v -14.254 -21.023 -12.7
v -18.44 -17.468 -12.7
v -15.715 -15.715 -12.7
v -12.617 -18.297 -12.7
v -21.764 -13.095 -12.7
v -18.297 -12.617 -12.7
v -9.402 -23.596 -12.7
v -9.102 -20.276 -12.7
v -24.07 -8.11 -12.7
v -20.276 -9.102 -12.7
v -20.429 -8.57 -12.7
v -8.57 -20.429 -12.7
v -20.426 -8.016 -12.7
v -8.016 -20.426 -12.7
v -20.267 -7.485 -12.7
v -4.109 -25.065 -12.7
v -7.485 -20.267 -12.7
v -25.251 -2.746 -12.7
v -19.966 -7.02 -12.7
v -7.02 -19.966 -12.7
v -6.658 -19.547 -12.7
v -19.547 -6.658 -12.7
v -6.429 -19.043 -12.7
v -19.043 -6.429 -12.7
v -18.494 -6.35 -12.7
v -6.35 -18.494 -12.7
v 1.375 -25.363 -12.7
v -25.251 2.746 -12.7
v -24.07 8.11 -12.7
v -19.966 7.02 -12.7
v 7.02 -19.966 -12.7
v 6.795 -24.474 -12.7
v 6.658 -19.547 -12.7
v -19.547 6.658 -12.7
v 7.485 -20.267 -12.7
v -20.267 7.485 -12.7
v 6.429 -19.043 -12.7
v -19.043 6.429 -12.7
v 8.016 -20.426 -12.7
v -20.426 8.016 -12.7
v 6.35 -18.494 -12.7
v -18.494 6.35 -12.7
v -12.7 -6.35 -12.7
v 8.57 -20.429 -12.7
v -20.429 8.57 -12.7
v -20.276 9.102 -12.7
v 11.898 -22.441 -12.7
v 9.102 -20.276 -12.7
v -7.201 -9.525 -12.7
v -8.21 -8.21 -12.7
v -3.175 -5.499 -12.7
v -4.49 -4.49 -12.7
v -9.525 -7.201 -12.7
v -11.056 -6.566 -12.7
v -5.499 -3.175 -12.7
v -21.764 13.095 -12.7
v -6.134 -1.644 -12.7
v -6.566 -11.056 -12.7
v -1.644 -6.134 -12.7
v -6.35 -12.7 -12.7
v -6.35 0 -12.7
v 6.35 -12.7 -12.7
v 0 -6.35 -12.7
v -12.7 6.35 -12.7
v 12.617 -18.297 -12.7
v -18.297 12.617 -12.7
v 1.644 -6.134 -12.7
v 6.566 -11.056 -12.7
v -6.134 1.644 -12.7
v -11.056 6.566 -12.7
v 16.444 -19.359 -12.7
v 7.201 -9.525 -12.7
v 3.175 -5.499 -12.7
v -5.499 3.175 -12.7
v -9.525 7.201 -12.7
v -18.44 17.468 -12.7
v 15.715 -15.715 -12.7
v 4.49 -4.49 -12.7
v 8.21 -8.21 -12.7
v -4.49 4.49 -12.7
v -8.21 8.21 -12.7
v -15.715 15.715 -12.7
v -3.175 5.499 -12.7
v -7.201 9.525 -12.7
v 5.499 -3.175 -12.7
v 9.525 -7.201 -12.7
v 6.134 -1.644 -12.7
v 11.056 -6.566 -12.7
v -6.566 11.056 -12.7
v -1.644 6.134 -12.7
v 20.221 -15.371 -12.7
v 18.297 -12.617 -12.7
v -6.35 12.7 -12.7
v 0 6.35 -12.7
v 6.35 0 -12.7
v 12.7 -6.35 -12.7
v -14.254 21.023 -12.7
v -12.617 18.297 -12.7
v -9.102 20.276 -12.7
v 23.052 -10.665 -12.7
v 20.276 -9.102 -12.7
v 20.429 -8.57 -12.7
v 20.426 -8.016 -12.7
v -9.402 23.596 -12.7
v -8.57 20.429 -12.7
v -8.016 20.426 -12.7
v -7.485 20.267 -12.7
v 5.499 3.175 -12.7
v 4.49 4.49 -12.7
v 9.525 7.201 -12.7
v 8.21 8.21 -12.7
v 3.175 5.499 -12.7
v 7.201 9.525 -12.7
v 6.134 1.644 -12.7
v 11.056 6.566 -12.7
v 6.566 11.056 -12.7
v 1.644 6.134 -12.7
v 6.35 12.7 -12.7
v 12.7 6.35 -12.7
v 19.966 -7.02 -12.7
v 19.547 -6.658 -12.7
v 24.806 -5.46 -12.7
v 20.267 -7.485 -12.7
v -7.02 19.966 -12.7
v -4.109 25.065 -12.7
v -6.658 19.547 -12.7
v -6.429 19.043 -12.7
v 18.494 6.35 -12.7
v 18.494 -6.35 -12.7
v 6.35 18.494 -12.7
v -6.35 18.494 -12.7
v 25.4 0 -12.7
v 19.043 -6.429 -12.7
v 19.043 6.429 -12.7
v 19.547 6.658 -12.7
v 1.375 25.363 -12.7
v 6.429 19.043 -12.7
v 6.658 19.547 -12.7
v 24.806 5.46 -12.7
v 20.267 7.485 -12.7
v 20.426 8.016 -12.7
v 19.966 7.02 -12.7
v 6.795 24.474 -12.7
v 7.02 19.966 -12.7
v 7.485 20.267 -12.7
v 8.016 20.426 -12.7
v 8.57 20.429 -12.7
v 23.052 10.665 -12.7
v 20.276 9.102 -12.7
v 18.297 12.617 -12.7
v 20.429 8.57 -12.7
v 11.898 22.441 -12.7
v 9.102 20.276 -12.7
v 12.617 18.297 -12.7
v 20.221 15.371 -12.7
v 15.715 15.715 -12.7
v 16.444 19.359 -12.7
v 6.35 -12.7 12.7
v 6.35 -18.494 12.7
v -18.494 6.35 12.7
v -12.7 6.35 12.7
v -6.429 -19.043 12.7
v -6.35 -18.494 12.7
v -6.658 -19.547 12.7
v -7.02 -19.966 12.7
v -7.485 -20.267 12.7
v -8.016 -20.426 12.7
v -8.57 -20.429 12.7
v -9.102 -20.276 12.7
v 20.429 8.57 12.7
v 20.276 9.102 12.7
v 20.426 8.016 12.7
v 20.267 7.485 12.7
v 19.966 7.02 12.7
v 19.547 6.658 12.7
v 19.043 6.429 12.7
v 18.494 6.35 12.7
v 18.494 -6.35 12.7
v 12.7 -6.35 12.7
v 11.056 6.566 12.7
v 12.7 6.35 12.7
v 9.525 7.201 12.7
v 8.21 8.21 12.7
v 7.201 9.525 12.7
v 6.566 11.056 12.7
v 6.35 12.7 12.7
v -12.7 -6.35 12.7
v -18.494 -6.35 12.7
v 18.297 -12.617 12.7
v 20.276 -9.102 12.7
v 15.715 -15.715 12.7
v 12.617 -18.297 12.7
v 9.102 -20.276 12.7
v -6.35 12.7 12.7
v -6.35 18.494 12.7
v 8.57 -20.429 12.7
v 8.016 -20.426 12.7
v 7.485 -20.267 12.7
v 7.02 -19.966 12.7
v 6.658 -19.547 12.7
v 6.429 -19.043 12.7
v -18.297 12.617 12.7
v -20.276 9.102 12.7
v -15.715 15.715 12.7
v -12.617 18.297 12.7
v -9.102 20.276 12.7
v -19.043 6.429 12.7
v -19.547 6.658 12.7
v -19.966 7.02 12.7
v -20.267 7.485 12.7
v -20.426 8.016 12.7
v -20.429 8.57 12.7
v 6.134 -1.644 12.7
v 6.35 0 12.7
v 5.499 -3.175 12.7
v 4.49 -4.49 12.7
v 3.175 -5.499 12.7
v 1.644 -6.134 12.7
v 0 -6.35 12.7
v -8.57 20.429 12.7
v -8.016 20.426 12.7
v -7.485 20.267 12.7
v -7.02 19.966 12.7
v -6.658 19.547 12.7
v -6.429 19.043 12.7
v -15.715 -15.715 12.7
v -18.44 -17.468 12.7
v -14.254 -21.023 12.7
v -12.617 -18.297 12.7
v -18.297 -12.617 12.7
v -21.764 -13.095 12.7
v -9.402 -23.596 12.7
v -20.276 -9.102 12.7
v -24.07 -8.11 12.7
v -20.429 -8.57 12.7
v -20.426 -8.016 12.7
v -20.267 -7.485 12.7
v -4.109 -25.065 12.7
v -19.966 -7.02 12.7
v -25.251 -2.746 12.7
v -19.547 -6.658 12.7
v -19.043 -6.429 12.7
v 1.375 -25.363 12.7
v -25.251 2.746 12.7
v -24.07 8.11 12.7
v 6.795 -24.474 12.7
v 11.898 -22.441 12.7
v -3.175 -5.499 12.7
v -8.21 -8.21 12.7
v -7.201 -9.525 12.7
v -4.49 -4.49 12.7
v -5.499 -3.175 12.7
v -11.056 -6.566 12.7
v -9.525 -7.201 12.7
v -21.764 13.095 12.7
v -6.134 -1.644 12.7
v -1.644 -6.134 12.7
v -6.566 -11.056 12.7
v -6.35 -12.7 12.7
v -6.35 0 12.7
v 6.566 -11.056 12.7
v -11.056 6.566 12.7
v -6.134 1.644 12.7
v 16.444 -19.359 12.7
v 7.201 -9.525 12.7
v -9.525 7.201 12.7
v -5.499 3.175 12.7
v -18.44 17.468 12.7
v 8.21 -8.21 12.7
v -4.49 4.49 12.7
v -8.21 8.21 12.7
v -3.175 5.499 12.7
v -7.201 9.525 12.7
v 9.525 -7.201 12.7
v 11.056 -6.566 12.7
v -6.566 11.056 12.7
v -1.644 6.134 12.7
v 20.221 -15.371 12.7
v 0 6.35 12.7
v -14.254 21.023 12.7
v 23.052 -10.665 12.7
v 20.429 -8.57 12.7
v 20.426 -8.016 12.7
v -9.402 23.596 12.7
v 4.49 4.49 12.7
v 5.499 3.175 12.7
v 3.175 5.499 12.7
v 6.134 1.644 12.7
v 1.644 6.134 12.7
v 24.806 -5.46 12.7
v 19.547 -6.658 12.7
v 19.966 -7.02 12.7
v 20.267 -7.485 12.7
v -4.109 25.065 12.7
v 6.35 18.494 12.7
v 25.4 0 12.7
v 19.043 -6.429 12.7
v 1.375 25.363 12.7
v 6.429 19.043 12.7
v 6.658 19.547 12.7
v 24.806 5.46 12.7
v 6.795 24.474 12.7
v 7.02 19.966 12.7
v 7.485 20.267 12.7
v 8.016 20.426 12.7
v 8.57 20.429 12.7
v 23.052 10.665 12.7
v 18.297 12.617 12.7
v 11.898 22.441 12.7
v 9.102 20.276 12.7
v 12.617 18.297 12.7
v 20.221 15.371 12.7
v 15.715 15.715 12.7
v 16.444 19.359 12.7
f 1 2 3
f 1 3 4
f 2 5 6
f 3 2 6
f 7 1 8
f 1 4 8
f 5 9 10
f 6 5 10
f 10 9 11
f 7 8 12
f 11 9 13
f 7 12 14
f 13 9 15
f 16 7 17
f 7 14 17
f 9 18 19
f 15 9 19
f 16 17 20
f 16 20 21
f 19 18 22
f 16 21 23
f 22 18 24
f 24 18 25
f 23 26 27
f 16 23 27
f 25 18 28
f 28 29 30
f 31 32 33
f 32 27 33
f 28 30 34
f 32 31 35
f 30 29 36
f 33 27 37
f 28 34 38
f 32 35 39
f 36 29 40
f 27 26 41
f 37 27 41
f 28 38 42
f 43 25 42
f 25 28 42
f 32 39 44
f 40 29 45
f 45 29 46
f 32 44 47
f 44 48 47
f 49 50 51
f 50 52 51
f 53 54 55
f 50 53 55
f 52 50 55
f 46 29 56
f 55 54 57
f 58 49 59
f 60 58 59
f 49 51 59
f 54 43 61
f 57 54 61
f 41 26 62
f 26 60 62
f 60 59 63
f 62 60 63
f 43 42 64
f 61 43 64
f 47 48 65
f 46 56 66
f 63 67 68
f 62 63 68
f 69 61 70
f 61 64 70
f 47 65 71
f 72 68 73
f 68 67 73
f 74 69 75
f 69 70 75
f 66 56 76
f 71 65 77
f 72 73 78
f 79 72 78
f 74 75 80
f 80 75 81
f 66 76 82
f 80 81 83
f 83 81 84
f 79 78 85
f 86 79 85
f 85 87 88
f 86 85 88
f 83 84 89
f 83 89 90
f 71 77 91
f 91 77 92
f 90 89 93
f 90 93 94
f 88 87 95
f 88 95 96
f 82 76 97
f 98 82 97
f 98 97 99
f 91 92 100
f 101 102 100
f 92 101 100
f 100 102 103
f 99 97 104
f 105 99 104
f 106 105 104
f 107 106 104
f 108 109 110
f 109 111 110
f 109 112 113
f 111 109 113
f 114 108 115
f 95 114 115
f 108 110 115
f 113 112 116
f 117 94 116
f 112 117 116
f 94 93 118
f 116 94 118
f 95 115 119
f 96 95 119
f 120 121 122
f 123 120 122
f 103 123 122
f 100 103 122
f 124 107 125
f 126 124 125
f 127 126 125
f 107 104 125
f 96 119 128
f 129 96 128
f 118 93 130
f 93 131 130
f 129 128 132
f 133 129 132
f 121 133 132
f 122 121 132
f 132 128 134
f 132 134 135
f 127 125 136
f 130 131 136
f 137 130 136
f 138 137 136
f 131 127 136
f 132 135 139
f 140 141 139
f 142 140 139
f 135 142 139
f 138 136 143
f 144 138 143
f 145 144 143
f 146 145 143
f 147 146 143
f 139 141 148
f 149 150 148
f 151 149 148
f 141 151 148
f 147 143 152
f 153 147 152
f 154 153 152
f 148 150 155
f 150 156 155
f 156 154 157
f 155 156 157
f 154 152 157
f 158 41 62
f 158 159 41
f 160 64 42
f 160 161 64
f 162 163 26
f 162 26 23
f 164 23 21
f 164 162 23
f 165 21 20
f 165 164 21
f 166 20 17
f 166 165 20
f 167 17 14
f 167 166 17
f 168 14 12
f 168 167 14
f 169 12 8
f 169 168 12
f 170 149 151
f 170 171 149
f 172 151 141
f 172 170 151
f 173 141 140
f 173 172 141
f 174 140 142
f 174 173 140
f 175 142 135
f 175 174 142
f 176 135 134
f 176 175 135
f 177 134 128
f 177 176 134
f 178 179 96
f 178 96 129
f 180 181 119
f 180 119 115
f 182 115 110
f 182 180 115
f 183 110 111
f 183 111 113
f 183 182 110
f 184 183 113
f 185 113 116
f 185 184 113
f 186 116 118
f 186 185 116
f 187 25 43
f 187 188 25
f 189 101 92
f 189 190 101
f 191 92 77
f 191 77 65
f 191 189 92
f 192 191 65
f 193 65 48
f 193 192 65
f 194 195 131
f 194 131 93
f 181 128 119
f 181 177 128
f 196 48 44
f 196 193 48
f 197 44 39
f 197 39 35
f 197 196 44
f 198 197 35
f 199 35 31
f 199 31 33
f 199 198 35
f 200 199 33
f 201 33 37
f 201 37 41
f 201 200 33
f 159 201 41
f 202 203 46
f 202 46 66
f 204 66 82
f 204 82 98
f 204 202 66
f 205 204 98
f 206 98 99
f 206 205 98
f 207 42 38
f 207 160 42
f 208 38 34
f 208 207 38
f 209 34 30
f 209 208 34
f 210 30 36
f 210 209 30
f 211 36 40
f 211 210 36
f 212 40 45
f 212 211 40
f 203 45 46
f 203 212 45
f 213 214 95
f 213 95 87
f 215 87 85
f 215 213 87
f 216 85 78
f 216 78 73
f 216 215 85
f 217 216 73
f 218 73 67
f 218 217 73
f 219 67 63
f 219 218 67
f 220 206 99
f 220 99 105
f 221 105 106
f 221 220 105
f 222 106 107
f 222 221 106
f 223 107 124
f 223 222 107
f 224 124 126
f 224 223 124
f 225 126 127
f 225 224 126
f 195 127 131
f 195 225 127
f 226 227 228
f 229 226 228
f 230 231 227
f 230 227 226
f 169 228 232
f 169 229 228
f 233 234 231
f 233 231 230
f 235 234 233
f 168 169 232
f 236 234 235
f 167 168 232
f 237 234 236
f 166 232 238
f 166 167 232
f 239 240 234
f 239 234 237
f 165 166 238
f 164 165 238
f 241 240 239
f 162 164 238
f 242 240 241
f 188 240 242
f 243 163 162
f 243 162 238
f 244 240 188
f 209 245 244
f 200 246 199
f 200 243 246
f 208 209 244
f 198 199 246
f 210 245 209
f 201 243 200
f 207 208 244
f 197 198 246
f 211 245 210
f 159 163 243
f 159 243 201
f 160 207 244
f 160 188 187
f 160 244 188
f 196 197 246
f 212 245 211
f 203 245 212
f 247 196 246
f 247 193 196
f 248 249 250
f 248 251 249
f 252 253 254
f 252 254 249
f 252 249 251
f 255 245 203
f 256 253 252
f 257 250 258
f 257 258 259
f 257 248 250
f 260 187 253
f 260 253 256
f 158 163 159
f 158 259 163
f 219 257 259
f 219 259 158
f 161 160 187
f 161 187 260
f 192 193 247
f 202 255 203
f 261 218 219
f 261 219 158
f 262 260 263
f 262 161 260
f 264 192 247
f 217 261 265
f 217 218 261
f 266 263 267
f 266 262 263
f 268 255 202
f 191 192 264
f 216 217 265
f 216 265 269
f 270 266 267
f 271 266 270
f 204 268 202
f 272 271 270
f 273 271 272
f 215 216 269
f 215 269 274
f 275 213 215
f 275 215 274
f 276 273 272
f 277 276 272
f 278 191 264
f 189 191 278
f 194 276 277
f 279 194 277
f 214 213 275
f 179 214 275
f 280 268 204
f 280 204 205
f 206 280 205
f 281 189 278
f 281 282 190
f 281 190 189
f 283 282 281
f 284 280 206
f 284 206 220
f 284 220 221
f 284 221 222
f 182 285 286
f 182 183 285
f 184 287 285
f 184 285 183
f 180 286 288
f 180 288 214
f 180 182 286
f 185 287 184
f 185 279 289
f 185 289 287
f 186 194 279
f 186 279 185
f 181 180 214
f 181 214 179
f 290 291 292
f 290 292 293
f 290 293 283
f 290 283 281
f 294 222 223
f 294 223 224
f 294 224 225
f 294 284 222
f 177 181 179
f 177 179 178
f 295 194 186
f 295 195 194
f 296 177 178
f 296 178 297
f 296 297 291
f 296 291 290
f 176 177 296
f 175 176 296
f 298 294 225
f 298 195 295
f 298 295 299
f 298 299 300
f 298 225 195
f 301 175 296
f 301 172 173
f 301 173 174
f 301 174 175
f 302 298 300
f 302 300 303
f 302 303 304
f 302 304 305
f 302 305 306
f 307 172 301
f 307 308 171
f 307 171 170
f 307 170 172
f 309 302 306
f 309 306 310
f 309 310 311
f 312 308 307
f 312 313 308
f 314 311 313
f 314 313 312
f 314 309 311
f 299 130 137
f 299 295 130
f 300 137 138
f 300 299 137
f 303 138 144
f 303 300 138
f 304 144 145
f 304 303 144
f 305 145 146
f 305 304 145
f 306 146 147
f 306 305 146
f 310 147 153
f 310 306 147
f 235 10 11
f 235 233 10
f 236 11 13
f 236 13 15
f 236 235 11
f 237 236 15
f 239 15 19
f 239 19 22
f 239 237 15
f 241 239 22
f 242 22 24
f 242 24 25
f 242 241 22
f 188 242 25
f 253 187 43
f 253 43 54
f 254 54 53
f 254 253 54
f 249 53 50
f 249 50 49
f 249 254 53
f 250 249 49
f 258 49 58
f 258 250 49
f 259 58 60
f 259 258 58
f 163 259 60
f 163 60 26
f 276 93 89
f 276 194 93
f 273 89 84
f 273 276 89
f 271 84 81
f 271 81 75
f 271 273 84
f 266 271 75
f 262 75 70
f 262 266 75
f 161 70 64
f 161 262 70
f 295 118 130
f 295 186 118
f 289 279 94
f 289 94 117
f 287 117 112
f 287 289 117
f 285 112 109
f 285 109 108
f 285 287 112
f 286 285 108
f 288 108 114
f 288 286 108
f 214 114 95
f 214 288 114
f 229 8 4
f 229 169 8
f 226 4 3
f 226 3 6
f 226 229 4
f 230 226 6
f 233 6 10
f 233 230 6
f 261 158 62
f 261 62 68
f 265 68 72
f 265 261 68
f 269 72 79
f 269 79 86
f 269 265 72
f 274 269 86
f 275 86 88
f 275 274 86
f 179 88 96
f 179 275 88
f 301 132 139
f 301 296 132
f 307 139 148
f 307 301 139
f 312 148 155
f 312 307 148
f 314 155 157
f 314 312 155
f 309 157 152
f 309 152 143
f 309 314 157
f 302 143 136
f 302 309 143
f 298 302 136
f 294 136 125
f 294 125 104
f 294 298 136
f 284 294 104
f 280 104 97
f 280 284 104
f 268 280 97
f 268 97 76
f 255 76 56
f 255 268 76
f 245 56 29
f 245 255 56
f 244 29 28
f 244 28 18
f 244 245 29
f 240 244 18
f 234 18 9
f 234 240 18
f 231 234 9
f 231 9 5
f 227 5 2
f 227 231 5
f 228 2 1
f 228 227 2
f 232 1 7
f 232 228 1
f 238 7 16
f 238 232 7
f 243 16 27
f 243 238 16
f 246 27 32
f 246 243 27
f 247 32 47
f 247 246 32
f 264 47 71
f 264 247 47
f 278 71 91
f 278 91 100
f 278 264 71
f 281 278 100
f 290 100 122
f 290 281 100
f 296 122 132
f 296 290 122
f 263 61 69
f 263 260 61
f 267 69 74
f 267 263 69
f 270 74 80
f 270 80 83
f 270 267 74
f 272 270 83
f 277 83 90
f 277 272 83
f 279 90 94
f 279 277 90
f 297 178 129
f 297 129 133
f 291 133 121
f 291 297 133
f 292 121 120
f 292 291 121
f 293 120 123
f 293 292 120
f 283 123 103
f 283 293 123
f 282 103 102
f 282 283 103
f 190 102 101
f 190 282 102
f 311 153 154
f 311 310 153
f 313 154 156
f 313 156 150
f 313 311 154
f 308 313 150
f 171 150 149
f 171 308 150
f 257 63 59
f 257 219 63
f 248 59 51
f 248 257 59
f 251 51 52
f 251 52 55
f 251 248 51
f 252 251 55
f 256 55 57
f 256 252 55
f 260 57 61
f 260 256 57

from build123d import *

# Parameters (mm, degrees)
F0_R     = 25.4
F1_DEPTH = 12.7


with BuildPart() as f1:
    # F0 (on Top) → F1 (new body, symmetric)
    with BuildSketch(Plane.XY):
        Circle(F0_R)
        with BuildLine():
            ThreePointArc((-12.7, -6.35), (-8.209872, -8.209872), (-6.35, -12.7))
            Line((-6.35, -12.7), (-6.35, -18.494382))
            ThreePointArc((-6.35, -18.494382), (-7.241618, -20.133529), (-9.102152, -20.275637))
            ThreePointArc((-9.102152, -20.275637), (-15.715448, -15.715448), (-20.275637, -9.102152))
            ThreePointArc((-20.275637, -9.102152), (-20.133529, -7.241617), (-18.494382, -6.35))
            Line((-18.494382, -6.35), (-12.7, -6.35))
        make_face(mode=Mode.SUBTRACT)
        with BuildLine():
            ThreePointArc((0, 6.35), (4.490128, 4.490128), (6.35, 0))
            ThreePointArc((6.35, 0), (4.490128, -4.490128), (0, -6.35))
            ThreePointArc((0, -6.35), (-4.490128, -4.490128), (-6.35, 0))
            ThreePointArc((-6.35, 0), (-4.490128, 4.490128), (0, 6.35))
        make_face(mode=Mode.SUBTRACT)
        with BuildLine():
            ThreePointArc((6.35, -12.7), (8.209872, -8.209872), (12.7, -6.35))
            Line((12.7, -6.35), (18.494382, -6.35))
            ThreePointArc((18.494382, -6.35), (20.133529, -7.241618), (20.275637, -9.102152))
            ThreePointArc((20.275637, -9.102152), (15.715448, -15.715448), (9.102152, -20.275637))
            ThreePointArc((9.102152, -20.275637), (7.241617, -20.133529), (6.35, -18.494382))
            Line((6.35, -18.494382), (6.35, -12.7))
        make_face(mode=Mode.SUBTRACT)
        with BuildLine():
            ThreePointArc((-20.275637, 9.102152), (-15.715448, 15.715448), (-9.102152, 20.275637))
            ThreePointArc((-9.102152, 20.275637), (-7.241618, 20.133529), (-6.35, 18.494382))
            Line((-6.35, 18.494382), (-6.35, 12.7))
            ThreePointArc((-6.35, 12.7), (-8.209872, 8.209872), (-12.7, 6.35))
            Line((-12.7, 6.35), (-18.494382, 6.35))
            ThreePointArc((-18.494382, 6.35), (-20.133529, 7.241618), (-20.275637, 9.102152))
        make_face(mode=Mode.SUBTRACT)
        with BuildLine():
            ThreePointArc((12.7, 6.35), (8.209872, 8.209872), (6.35, 12.7))
            Line((6.35, 12.7), (6.35, 18.494382))
            ThreePointArc((6.35, 18.494382), (7.241618, 20.133529), (9.102152, 20.275637))
            ThreePointArc((9.102152, 20.275637), (15.715448, 15.715448), (20.275637, 9.102152))
            ThreePointArc((20.275637, 9.102152), (20.133529, 7.241618), (18.494382, 6.35))
            Line((18.494382, 6.35), (12.7, 6.35))
        make_face(mode=Mode.SUBTRACT)
    extrude(amount=F1_DEPTH, both=True)


solid = f1.part
